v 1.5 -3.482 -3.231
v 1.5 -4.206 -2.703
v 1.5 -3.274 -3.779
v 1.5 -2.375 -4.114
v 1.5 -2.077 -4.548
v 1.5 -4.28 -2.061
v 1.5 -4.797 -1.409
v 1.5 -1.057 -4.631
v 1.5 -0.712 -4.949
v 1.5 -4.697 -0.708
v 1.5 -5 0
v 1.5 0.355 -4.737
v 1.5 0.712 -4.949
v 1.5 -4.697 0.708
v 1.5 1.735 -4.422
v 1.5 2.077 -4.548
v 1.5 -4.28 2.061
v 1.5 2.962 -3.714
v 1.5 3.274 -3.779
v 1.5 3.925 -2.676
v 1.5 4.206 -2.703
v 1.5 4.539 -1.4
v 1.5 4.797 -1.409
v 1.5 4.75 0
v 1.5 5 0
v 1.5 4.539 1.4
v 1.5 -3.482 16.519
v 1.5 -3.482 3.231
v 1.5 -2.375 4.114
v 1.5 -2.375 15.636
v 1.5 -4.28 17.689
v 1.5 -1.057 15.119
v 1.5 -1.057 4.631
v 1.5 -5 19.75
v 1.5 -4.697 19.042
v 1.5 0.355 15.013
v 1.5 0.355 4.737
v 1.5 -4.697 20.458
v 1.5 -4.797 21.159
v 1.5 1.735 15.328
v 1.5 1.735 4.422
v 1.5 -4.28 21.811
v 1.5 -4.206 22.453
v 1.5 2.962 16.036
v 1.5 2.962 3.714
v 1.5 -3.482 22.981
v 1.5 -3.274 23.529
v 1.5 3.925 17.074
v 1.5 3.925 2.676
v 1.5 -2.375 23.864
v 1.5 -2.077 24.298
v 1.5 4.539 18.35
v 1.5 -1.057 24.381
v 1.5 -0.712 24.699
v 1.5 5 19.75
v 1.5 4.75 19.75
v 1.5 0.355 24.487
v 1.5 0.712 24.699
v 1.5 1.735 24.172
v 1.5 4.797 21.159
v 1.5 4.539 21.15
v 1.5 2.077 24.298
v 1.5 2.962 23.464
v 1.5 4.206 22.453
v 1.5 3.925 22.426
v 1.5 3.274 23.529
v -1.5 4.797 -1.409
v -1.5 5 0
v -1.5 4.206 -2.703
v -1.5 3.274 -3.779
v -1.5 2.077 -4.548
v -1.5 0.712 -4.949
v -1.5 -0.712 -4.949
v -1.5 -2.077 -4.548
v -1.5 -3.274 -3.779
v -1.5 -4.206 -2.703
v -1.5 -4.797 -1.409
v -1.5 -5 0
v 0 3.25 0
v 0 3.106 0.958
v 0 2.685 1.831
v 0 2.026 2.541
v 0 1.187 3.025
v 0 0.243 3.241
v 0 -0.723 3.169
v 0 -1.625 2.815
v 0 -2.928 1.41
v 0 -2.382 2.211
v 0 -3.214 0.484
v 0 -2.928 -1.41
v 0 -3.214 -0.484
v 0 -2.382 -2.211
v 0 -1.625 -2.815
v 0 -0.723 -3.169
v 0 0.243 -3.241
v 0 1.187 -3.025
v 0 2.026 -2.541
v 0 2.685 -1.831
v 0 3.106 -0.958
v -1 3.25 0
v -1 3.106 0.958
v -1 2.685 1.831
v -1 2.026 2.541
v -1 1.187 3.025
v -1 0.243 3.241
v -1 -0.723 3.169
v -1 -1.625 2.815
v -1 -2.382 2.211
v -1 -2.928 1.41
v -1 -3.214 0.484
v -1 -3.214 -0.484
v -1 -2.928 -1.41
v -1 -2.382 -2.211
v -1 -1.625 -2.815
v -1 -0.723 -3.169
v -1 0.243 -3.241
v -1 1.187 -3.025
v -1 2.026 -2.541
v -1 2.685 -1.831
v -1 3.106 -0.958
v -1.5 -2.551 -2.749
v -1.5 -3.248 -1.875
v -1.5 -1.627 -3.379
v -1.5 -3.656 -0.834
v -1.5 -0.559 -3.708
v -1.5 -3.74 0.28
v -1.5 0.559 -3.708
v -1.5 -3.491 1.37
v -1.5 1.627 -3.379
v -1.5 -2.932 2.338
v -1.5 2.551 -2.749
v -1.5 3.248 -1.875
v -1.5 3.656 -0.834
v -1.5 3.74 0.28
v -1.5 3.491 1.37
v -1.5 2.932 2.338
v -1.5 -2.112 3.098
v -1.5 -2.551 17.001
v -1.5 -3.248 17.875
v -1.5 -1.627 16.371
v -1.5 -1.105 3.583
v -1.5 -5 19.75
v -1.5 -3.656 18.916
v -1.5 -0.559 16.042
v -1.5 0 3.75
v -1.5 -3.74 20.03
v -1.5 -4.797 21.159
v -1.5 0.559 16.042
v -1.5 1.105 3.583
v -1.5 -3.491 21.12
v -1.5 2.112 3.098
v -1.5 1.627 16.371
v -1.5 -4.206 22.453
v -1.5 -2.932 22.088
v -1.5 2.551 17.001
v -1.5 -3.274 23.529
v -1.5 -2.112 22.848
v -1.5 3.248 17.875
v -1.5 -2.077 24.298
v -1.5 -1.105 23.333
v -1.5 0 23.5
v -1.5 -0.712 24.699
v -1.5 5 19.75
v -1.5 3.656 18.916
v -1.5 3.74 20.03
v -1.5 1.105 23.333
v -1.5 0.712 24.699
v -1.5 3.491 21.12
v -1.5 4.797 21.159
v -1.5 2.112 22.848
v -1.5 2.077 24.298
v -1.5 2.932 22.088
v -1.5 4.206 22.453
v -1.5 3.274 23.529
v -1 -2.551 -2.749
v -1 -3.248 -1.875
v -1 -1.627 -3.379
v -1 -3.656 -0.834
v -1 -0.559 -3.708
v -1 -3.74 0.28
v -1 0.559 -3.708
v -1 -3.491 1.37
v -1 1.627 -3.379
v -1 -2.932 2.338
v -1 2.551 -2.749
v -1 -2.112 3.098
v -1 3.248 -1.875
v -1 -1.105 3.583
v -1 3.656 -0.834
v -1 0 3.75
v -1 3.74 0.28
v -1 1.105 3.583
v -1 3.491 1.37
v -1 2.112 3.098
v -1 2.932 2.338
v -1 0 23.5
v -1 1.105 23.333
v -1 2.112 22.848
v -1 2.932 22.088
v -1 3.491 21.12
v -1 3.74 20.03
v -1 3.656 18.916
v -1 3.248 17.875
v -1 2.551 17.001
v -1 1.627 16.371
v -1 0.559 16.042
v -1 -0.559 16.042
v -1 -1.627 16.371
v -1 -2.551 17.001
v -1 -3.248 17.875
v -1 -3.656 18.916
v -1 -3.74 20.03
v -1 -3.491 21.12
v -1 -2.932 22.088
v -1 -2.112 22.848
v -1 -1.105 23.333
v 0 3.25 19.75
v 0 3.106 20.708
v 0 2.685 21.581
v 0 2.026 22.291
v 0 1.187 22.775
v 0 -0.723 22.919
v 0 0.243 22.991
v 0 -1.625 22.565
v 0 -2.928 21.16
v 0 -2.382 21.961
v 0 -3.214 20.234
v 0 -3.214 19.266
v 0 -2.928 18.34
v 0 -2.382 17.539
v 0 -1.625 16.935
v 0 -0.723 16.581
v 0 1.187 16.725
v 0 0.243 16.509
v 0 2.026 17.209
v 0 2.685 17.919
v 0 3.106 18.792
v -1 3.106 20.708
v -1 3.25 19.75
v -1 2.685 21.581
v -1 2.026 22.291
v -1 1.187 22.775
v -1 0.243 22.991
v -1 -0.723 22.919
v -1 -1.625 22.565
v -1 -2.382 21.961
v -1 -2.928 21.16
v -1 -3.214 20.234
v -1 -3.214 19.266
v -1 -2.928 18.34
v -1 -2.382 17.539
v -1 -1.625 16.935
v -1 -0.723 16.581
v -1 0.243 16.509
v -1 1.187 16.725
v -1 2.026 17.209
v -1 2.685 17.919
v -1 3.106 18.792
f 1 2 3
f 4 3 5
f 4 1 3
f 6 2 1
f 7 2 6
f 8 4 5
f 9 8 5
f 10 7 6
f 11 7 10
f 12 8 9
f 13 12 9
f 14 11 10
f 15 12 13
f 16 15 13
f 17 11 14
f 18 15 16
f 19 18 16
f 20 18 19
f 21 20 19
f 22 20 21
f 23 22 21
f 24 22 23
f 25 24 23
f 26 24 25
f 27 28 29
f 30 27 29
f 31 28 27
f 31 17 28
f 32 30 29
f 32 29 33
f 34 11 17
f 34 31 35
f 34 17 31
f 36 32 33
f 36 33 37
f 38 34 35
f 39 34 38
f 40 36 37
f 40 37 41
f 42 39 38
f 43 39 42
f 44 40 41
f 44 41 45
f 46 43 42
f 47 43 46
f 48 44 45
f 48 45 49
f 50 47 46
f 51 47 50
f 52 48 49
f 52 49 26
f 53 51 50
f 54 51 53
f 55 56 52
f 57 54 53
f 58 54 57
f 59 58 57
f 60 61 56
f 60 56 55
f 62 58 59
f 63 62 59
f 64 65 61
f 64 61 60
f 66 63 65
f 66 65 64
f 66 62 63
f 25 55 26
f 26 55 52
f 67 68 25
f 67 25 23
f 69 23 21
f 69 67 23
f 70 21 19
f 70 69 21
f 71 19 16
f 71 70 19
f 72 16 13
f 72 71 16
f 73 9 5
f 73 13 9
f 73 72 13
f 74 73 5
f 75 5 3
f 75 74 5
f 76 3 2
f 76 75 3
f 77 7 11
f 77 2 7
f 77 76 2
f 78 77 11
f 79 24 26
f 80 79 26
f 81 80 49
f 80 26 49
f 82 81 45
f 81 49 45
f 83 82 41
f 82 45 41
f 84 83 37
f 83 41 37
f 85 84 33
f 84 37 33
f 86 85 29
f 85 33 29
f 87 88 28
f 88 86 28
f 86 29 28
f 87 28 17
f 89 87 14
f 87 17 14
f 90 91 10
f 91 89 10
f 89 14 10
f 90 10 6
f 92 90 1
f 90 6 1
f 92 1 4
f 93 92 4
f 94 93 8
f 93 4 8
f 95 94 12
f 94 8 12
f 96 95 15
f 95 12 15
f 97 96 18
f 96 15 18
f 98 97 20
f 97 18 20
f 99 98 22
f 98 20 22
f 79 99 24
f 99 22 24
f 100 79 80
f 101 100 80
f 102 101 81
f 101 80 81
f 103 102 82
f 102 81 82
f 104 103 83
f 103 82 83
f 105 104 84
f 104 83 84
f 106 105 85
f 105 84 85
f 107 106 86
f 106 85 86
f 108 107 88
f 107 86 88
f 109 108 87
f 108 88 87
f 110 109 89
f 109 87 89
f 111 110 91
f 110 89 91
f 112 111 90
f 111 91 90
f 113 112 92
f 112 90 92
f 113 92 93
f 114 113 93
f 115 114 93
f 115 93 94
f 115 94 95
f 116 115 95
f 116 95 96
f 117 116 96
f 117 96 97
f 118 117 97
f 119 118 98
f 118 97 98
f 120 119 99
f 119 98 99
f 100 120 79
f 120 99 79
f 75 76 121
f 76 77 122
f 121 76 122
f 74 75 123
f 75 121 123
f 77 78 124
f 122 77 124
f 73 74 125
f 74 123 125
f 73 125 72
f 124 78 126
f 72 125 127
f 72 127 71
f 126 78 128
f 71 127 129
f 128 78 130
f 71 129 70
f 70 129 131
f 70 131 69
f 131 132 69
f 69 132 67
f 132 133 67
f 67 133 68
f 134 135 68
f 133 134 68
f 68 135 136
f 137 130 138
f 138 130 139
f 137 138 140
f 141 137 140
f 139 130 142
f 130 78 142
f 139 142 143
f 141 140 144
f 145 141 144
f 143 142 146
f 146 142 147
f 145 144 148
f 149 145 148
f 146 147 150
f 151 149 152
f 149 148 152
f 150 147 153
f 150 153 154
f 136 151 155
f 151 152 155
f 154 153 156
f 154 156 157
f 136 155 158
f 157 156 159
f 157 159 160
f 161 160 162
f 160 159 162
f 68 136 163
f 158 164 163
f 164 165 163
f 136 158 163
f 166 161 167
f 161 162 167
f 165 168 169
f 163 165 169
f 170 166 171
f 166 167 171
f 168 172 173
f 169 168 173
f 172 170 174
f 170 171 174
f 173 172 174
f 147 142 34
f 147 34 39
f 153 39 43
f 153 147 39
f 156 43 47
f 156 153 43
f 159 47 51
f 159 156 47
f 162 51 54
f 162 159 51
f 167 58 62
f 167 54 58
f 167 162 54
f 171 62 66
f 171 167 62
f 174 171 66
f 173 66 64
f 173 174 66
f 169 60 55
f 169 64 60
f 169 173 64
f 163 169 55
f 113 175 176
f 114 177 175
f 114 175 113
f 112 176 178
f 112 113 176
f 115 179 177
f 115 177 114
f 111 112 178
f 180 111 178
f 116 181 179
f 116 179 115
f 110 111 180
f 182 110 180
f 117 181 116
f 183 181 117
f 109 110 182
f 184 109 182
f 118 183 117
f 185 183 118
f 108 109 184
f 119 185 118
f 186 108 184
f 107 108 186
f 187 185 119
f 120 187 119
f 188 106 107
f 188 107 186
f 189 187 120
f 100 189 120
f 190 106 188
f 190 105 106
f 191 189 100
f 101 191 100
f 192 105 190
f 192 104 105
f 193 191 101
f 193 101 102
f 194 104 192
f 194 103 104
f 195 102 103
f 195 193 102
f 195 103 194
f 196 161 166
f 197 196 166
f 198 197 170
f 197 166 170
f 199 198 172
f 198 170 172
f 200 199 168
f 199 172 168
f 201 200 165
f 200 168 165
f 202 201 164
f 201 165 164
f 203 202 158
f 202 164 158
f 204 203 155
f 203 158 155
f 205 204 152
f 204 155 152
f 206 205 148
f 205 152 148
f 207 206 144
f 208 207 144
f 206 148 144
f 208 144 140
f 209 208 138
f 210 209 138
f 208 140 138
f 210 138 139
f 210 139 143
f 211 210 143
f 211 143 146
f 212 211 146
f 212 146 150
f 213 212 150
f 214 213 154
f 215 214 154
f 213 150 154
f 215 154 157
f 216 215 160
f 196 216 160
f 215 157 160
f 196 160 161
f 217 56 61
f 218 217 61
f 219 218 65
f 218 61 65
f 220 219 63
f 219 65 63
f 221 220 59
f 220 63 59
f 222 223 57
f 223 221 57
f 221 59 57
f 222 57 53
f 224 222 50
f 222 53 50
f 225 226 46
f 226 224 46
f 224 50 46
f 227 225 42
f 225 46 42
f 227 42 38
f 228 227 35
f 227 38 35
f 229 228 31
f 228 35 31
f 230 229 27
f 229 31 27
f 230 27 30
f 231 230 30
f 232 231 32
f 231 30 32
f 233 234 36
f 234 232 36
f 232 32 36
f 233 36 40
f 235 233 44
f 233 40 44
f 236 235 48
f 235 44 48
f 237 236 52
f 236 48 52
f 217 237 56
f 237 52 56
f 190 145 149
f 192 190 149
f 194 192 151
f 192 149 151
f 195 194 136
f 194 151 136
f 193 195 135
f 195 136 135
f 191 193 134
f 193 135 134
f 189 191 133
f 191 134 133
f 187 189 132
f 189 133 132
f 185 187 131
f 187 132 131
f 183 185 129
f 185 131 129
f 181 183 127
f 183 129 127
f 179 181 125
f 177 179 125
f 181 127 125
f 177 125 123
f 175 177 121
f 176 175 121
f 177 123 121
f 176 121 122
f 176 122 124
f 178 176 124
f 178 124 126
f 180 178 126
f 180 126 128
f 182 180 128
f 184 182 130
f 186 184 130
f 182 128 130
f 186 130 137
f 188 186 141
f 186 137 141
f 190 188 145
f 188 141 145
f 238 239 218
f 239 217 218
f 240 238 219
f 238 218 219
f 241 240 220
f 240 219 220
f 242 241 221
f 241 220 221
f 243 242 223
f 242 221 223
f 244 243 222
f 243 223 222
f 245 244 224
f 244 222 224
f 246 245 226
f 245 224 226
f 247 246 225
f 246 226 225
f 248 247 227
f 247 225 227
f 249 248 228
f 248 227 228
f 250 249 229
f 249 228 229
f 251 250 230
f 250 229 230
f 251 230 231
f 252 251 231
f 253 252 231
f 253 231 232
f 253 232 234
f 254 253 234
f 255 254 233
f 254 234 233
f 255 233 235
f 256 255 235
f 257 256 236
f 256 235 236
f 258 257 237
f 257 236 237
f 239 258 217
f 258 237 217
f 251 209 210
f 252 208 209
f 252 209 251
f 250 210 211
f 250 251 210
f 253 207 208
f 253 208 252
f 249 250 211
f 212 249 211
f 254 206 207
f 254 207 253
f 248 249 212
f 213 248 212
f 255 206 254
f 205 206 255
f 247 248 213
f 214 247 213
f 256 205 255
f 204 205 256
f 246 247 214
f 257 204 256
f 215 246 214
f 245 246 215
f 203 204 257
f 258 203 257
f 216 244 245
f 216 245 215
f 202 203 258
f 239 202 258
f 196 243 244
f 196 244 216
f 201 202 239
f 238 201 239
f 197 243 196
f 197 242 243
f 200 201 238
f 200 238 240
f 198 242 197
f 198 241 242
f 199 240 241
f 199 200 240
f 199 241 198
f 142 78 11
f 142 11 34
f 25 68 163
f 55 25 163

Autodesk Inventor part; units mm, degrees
ref_plane "YZ Plane" through (0, 0, 0) normal (1, 0, 0) x (0, 1, 0)
ref_plane "XZ Plane" through (0, 0, 0) normal (0, 1, 0) x (-1, 0, 0)
ref_plane "XY Plane" through (0, 0, 0) normal (0, 0, 1) x (1, 0, 0)
sketch "Boceto1" plane through (0, 0, 0) normal (1, 0, 0) x (0, 1, 0)
  line L0 (0, 0) -> (0, 19.75)
  circle A0 centre (0, 19.75) radius 5
  circle A1 centre (0, 0) radius 5
  line L1 (5, 0) -> (5, 19.75)
  line L2 (-5, 0) -> (-5, 19.75)
  circle A2 centre (0, 19.75) radius 3.25
  circle A3 centre (0, 0) radius 3.25
  dimension "d0" = 19.75
  dimension "d1" = 10
  dimension "d2" = 10
  dimension "d5" = 6.5
  dimension "d6" = 6.5
extrude "Extrusión1" add sketch "Boceto1" along normal mid plane 3
sketch "Boceto2" plane through (-1.5, 0, 0) normal (-1, 0, 0) x (0, 0, 1)
  circle A0 centre (0, 0) radius 3.75
  line L0 (0, 0) -> (19.75, 0)
  circle A1 centre (19.75, 0) radius 3.75
  dimension "d7" = 7.5
  dimension "d8" = 19.75
  dimension "d9" = 7.5
extrude "Extrusión2" cut sketch "Boceto2" against normal blind 0.5
chamfer "Chaflán1" distance 1.5 angle 45 2 edges at (1.5, -3.25, 19.75) (1.5, -3.25, 0)
equation "\"d0\" = m2_r3"
equation "\"d1\" = width_r3"
equation "\"d2\" = width_r3"
equation "\"d5\" = sj_diam_shaft + 0.5 * offset"
equation "\"d6\" = sj_diam_shaft + 0.5 * offset"
equation "\"d3\" = t_thikness"
equation "\"d7\" = sj_head_D + 0.5 * offset"
equation "\"d8\" = m2_r3"
equation "\"d9\" = sj_head_D + 0.5 * offset"
equation "\"d10\" = 0.5 * offset"
equation "\"offset\" = 1"
equation "\"m2_r3\" = 19.75"
equation "\"width_r3\" = 10"
equation "\"t_thikness\" = 3"
equation "\"sj_diam_shaft\" = 6"
equation "\"sj_head_D\" = 7"
equation "\"thikness\" = 2"
equation "\"r1\" = 5.55"
equation "\"r2o\" = 59.75"
equation "\"delta_y\" = 6"
equation "\"wire_d\" = 1"
equation "\"width_ang_spring\" = 5"
equation "\"spring_int_diam\" = 8.5"
equation "\"spring_ext_diam\" = 10.5"
equation "\"r3\" = 8.25"
equation "\"r3R\" = 4.75"
equation "\"r3T\" = 6.74537"
equation "\"alpha\" = 54.847297deg"
equation "\"alpha2\" = 270deg"
equation "\"theta3_recogido\" = 305.152703deg"
equation "\"delta_theta_3\" = 45deg"
equation "\"joint_width\" = 12"
equation "\"joint_radius\" = 7.75"
equation "\"shaft_width\" = 15"
equation "\"shaft_joint_diameter\" = 7.75"
equation "\"separation_space\" = 0.5"
equation "\"height_finger\" = 42"
equation "\"cell_screw_head_diameter\" = 4"
equation "\"cell_screw_diameter\" = 2"
equation "\"cell_space\" = 2"
equation "\"cell_width\" = 6"
equation "\"cell_theta_position\" = 60deg"
equation "\"cell_thikness\" = 1"
equation "\"cell_lenght\" = 37"
equation "\"cell_z_space\" = 5"
equation "\"wire_D\" = 2.3"
equation "\"width_link\" = 8"
equation "\"Dt\" = 1.05949"
equation "\"Djoint_shaft\" = 2.3"
equation "\"shaft_x\" = 1.45"
equation "\"shaft_y\" = 6.45"
equation "\"lenght_body_link\" = 186.05"
equation "\"lenght_bar_support\" = 201.65"
equation "\"wire_spring_d\" = 1"
equation "\"spring_int_d\" = 6"
equation "\"spring_lenght\" = 28"
equation "\"trigger_offset\" = 2"
equation "\"m2_theta2o\" = 107deg"
equation "\"m2_r2\" = 28"
equation "\"e\" = 9"
equation "\"So\" = 17"
equation "\"m2_theta3o\" = -30deg"
equation "\"m2_delta_theta1\" = 15deg"
equation "\"m2_theta3f\" = -60deg"
equation "\"trigger_thumb_lenght\" = 6"
equation "\"width_r12\" = 8"
equation "\"m2_r1\" = 25.2"
equation "\"r3_thikness\" = 3.5"
equation "\"tg_width\" = 4"
equation "\"pivot_screw_d\" = 4"
equation "\"pivot_diameter\" = 7"
equation "\"sj_groove\" = 2"
equation "\"sj_groove_deep\" = 7"
equation "\"sj_head_d\" = 4.7464"
equation "\"sj_head_height\" = 5"
equation "\"sf_lenght\" = 9.5"
equation "\"sf_base\" = 3"
equation "\"sf_head_height\" = 3"
equation "\"sf_head_width\" = 4.5"
equation "\"sf_head_offset\" = 0.25"
equation "\"sf_head_grip_width\" = 2"
equation "\"sf_head_angle\" = 45deg"
equation "\"sf_thikness\" = 5"
equation "\"screw_Dhead\" = 8"
equation "\"screw_d\" = 4"
equation "\"screw_lenght\" = 12"
equation "\"screwJ_base_D\" = 9"
equation "\"screwJ_top_D\" = 13"
equation "\"gj_D\" = 6"
equation "\"gj_d\" = 4"
equation "\"gj_out_section\" = 6"
equation "\"ext_width_slider\" = 3.5"
equation "\"sfbox_tip_width\" = 2.5"
equation "\"slim_width_slider\" = 1.5"
equation "\"agarradera_width\" = 4"
equation "\"int_width_slider\" = 2"
equation "\"agarradera_position\" = 82.13077"
equation "\"sfbox_theta1\" = 60deg"
equation "\"sfbox_theta2\" = 45deg"
equation "\"agarradera_theta\" = 60deg"
equation "\"sfbox_width\" = 1.5"
equation "\"box_fat_slider_lenght\" = 67"
equation "\"fat_width_slider\" = 2"
equation "\"box_in_width\" = 72"
equation "\"flex_separation_theta\" = 60deg"
equation "\"sf_flex_separation\" = 38.66667"
equation "\"thikness_box\" = 1.5"
equation "\"box_slim_slider_lenght\" = 116"
equation "\"box_in_deep\" = 77"
equation "\"box_in_height\" = 35"
properties part number "link3" material "Plástico PPS"
